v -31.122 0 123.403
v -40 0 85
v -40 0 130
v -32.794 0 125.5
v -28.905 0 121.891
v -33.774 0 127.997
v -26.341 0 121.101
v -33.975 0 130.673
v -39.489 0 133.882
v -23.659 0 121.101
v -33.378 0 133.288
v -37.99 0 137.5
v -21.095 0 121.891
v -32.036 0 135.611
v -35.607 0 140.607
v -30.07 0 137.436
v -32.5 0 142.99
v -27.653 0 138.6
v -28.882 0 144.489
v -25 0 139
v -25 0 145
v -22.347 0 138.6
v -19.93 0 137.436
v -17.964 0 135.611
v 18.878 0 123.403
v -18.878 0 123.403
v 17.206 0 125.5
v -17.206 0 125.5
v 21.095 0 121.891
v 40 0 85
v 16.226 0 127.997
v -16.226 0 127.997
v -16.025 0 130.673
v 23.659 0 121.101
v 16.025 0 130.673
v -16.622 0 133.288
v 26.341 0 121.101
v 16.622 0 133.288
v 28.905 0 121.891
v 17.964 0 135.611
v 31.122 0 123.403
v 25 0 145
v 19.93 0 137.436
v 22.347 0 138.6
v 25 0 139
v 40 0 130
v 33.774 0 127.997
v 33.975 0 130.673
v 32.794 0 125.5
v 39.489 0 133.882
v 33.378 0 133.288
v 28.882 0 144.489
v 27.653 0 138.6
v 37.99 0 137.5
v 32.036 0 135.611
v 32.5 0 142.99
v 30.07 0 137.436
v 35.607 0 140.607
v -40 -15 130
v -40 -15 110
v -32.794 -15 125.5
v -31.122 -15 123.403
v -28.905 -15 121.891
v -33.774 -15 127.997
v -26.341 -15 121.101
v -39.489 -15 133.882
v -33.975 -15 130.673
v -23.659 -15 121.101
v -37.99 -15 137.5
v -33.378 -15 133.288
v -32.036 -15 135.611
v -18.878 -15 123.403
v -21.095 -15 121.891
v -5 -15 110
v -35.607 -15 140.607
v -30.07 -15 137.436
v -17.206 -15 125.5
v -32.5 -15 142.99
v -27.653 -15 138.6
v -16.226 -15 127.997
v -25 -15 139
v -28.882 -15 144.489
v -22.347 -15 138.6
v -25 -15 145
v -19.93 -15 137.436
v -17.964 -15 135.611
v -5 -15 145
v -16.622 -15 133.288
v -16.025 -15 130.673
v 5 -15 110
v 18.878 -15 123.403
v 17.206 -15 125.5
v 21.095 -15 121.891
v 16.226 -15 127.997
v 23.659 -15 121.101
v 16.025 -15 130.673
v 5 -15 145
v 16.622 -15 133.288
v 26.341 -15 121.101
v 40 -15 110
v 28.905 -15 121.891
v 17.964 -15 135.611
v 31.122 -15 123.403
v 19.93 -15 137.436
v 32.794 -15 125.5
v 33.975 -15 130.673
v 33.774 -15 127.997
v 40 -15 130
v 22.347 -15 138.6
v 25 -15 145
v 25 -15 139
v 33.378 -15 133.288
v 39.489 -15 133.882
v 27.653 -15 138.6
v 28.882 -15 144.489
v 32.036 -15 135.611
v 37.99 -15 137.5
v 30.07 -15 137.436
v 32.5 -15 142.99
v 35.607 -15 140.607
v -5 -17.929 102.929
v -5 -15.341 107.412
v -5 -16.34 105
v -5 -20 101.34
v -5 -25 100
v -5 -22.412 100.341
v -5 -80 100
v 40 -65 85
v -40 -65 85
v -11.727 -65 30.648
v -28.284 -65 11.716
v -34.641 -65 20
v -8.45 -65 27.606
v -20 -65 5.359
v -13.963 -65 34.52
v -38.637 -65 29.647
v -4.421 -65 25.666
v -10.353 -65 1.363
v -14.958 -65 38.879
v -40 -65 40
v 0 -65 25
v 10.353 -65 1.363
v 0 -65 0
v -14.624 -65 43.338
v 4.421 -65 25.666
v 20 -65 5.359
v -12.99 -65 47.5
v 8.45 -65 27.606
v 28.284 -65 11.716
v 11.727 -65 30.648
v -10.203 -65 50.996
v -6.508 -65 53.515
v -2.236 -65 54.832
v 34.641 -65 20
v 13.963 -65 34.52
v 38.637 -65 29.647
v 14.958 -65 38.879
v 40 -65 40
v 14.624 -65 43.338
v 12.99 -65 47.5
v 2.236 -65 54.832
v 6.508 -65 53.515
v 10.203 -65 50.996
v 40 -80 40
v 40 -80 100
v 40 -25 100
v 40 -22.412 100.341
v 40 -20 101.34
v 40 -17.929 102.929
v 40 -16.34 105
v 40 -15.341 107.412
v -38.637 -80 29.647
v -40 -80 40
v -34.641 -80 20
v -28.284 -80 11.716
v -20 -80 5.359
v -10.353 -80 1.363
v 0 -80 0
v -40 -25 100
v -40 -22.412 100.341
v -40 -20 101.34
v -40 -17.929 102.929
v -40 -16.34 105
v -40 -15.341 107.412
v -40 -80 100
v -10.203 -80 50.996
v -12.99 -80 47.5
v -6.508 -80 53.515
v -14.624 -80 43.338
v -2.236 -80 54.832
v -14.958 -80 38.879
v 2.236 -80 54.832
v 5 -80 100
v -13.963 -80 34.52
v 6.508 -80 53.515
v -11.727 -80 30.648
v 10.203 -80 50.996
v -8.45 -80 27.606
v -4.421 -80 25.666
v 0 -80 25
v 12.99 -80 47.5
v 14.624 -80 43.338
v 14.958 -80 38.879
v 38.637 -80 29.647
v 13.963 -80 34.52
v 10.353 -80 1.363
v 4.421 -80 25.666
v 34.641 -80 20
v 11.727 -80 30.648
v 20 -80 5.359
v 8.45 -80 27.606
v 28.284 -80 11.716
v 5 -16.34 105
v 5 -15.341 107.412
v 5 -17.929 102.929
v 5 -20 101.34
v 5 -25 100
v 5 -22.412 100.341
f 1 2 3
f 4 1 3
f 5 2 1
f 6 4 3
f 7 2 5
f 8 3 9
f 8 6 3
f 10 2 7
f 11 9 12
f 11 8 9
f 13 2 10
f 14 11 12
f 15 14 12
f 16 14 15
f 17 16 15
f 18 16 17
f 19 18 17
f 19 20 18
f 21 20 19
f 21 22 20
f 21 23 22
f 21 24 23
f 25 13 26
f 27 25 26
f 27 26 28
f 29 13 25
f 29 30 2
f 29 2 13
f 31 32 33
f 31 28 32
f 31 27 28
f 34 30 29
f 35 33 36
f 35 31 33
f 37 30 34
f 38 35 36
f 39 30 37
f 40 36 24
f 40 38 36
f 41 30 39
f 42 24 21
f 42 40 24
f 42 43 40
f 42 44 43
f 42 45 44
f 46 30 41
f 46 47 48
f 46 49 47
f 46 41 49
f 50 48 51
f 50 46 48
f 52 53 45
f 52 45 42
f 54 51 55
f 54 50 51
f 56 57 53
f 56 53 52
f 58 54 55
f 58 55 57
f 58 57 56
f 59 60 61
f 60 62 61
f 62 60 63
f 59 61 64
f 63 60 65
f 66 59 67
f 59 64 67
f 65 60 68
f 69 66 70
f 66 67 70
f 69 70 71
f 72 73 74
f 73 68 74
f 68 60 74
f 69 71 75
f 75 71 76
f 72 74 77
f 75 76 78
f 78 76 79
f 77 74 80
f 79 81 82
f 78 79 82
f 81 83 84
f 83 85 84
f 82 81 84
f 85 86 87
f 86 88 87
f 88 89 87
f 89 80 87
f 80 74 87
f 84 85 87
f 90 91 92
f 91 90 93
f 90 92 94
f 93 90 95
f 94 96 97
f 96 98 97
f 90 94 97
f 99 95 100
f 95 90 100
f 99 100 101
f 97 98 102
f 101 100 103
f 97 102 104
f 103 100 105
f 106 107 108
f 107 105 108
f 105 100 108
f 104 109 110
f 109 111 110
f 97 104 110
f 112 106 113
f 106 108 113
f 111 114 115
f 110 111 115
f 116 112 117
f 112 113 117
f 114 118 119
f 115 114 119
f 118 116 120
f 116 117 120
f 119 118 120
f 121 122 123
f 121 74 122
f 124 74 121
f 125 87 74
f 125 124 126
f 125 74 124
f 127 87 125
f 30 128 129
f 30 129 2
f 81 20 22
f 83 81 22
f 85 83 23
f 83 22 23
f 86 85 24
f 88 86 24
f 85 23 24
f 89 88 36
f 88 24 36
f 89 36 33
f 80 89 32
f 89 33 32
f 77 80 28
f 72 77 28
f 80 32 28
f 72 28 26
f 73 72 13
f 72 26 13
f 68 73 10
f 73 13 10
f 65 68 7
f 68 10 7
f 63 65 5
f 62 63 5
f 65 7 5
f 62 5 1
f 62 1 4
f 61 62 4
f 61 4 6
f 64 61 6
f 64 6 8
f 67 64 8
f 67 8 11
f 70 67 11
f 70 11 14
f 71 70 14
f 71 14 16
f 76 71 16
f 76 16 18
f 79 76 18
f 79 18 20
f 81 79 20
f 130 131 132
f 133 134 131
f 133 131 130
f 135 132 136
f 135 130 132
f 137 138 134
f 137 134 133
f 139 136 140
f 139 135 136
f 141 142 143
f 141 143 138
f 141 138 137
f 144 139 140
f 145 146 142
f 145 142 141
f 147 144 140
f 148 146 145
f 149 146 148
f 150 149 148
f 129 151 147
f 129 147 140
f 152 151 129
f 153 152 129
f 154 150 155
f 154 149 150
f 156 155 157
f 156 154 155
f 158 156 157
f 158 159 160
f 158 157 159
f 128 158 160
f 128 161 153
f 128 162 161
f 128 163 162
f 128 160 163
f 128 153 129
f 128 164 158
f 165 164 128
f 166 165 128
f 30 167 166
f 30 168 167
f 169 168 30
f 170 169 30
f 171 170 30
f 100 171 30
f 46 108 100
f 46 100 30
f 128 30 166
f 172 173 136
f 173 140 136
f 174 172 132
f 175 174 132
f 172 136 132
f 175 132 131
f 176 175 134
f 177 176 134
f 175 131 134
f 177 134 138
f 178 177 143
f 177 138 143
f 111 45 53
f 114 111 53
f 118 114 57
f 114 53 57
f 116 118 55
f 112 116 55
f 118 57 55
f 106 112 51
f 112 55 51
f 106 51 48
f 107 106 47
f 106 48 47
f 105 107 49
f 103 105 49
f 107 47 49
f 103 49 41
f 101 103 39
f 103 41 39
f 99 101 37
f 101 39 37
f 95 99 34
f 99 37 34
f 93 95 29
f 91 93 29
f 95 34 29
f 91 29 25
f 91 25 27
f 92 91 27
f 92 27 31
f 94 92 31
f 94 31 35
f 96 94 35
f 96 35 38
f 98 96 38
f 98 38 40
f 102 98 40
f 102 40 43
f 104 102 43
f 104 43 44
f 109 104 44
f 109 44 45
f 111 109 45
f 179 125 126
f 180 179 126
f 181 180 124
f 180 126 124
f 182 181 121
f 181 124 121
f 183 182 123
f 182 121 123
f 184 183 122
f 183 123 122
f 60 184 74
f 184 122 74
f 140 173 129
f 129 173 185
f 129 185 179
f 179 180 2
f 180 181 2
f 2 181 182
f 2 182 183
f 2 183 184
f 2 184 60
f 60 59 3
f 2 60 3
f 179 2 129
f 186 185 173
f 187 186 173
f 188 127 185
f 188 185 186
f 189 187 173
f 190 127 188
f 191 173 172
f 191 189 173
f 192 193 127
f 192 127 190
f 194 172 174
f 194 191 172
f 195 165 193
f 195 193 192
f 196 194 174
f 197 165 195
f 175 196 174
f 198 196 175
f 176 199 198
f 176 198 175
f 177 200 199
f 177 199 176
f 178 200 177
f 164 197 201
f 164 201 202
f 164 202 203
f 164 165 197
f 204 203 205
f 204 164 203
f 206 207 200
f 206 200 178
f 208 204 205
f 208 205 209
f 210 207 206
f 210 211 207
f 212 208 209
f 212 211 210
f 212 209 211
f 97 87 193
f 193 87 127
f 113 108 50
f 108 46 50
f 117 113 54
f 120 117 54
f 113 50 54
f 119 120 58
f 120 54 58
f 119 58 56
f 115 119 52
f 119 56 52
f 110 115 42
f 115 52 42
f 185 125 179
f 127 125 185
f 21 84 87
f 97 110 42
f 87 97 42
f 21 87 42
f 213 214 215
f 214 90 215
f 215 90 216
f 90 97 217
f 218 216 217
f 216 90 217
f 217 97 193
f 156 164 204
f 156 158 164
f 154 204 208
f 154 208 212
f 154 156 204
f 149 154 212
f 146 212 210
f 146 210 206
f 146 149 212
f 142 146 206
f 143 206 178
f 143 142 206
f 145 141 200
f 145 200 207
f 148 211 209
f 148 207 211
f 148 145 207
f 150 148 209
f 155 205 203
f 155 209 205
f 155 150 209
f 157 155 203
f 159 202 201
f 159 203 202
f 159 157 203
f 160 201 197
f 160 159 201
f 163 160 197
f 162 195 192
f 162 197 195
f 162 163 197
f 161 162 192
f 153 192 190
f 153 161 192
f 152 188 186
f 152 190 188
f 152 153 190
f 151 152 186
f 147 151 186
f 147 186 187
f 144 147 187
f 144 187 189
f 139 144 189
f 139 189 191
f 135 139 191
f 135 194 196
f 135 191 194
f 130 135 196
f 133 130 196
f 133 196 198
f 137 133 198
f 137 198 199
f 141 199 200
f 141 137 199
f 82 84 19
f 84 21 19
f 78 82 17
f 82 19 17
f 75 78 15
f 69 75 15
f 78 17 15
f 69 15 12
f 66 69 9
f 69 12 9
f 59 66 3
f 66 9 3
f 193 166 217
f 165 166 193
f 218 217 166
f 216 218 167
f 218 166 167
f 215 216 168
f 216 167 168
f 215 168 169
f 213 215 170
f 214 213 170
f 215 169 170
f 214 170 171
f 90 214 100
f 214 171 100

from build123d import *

# Parameters (mm, degrees)
BOSS_EXTRUDE1_DEPTH     = 40
SKETCH2_W               = 15
SKETCH2_H               = 45
BOSS_EXTRUDE2_DEPTH     = 40
FILLET1_R               = 15
SKETCH9_R               = 9
CUT_EXTRUDE1_DEPTH      = 80
FILLET2_R               = 40
CUT_EXTRUDE6_DEPTH      = 171.367250374
CUT_EXTRUDE6_DEPTH_BACK = 171.367250374
SKETCH11_R              = 15
FILLET3_R               = 10
RIB17_REACH             = 172.367
SKETCH14_WALL_W         = 421.791442252
SKETCH14_WALL_H         = 10


with BuildPart() as part:
    # Sketch1 → Boss-Extrude1 (new, symmetric)
    with BuildSketch(Plane.YZ):
        Polygon((-65, 0), (-65, 85), (0, 85), (0, 100), (-80, 100), (-80, 0), align=None)
    extrude(amount=BOSS_EXTRUDE1_DEPTH, both=True)

    # Sketch2 → Boss-Extrude2 (add, symmetric)
    with BuildSketch(Plane.YZ):
        with Locations((-7.5, 122.5)):
            Rectangle(SKETCH2_W, SKETCH2_H)
    extrude(amount=BOSS_EXTRUDE2_DEPTH, both=True)

    # Fillet1
    fillet1_edges = [part.edges().sort_by_distance(p)[0] for p in [
        (-40, -7.5, 145),
        (40, -7.5, 145),
    ]]
    fillet(fillet1_edges, radius=FILLET1_R)

    # Sketch9 → Cut-Extrude1 (cut)
    with BuildSketch(Plane(origin=(0, 0, 0), x_dir=(-1, 0, 0), z_dir=(0, 1, 0))):
        with Locations(Location((25, 130, 0), (0, 0, 90))):
            Circle(SKETCH9_R)
        with Locations(Location((-25, 130, 0), (0, 0, 90))):
            Circle(SKETCH9_R)
    extrude(amount=-CUT_EXTRUDE1_DEPTH, mode=Mode.SUBTRACT)

    # Fillet2
    fillet2_edges = [part.edges().sort_by_distance(p)[0] for p in [
        (-40, -72.5, 0),
        (40, -72.5, 0),
    ]]
    fillet(fillet2_edges, radius=FILLET2_R - 0.0001)  # a hair under: the kernel refuses the full size

    # Sketch11 → Cut-Extrude6 (cut, two sides: drawn at the far end of the back side and taken through both)
    with BuildSketch(Plane.XZ.offset(80).offset(-CUT_EXTRUDE6_DEPTH_BACK)):
        with Locations(Location((0, 40, 0), (0, 0, 270))):
            Circle(SKETCH11_R)
    extrude(amount=CUT_EXTRUDE6_DEPTH + CUT_EXTRUDE6_DEPTH_BACK, mode=Mode.SUBTRACT)

    # Fillet3
    fillet3_edges = [part.edges().sort_by_distance(p)[0] for p in [
        (0, -15, 100),
    ]]
    fillet(fillet3_edges, radius=FILLET3_R)

    # Sketch14 wall → Rib17 (add, up to next)
    with BuildSketch(Plane(origin=(0, -47.5, 122.5), x_dir=(0, -0.822192191644, -0.56920997883), z_dir=(0, 0.56920997883, -0.822192191644)), mode=Mode.PRIVATE) as rib17_sk1:
        Rectangle(SKETCH14_WALL_W, SKETCH14_WALL_H)
    rib17_tool1 = extrude(rib17_sk1.sketch, amount=RIB17_REACH, mode=Mode.PRIVATE) - part.part
    add(rib17_tool1.solids().sort_by_distance((0, -47.5, 122.5))[0])


solid = part.part
